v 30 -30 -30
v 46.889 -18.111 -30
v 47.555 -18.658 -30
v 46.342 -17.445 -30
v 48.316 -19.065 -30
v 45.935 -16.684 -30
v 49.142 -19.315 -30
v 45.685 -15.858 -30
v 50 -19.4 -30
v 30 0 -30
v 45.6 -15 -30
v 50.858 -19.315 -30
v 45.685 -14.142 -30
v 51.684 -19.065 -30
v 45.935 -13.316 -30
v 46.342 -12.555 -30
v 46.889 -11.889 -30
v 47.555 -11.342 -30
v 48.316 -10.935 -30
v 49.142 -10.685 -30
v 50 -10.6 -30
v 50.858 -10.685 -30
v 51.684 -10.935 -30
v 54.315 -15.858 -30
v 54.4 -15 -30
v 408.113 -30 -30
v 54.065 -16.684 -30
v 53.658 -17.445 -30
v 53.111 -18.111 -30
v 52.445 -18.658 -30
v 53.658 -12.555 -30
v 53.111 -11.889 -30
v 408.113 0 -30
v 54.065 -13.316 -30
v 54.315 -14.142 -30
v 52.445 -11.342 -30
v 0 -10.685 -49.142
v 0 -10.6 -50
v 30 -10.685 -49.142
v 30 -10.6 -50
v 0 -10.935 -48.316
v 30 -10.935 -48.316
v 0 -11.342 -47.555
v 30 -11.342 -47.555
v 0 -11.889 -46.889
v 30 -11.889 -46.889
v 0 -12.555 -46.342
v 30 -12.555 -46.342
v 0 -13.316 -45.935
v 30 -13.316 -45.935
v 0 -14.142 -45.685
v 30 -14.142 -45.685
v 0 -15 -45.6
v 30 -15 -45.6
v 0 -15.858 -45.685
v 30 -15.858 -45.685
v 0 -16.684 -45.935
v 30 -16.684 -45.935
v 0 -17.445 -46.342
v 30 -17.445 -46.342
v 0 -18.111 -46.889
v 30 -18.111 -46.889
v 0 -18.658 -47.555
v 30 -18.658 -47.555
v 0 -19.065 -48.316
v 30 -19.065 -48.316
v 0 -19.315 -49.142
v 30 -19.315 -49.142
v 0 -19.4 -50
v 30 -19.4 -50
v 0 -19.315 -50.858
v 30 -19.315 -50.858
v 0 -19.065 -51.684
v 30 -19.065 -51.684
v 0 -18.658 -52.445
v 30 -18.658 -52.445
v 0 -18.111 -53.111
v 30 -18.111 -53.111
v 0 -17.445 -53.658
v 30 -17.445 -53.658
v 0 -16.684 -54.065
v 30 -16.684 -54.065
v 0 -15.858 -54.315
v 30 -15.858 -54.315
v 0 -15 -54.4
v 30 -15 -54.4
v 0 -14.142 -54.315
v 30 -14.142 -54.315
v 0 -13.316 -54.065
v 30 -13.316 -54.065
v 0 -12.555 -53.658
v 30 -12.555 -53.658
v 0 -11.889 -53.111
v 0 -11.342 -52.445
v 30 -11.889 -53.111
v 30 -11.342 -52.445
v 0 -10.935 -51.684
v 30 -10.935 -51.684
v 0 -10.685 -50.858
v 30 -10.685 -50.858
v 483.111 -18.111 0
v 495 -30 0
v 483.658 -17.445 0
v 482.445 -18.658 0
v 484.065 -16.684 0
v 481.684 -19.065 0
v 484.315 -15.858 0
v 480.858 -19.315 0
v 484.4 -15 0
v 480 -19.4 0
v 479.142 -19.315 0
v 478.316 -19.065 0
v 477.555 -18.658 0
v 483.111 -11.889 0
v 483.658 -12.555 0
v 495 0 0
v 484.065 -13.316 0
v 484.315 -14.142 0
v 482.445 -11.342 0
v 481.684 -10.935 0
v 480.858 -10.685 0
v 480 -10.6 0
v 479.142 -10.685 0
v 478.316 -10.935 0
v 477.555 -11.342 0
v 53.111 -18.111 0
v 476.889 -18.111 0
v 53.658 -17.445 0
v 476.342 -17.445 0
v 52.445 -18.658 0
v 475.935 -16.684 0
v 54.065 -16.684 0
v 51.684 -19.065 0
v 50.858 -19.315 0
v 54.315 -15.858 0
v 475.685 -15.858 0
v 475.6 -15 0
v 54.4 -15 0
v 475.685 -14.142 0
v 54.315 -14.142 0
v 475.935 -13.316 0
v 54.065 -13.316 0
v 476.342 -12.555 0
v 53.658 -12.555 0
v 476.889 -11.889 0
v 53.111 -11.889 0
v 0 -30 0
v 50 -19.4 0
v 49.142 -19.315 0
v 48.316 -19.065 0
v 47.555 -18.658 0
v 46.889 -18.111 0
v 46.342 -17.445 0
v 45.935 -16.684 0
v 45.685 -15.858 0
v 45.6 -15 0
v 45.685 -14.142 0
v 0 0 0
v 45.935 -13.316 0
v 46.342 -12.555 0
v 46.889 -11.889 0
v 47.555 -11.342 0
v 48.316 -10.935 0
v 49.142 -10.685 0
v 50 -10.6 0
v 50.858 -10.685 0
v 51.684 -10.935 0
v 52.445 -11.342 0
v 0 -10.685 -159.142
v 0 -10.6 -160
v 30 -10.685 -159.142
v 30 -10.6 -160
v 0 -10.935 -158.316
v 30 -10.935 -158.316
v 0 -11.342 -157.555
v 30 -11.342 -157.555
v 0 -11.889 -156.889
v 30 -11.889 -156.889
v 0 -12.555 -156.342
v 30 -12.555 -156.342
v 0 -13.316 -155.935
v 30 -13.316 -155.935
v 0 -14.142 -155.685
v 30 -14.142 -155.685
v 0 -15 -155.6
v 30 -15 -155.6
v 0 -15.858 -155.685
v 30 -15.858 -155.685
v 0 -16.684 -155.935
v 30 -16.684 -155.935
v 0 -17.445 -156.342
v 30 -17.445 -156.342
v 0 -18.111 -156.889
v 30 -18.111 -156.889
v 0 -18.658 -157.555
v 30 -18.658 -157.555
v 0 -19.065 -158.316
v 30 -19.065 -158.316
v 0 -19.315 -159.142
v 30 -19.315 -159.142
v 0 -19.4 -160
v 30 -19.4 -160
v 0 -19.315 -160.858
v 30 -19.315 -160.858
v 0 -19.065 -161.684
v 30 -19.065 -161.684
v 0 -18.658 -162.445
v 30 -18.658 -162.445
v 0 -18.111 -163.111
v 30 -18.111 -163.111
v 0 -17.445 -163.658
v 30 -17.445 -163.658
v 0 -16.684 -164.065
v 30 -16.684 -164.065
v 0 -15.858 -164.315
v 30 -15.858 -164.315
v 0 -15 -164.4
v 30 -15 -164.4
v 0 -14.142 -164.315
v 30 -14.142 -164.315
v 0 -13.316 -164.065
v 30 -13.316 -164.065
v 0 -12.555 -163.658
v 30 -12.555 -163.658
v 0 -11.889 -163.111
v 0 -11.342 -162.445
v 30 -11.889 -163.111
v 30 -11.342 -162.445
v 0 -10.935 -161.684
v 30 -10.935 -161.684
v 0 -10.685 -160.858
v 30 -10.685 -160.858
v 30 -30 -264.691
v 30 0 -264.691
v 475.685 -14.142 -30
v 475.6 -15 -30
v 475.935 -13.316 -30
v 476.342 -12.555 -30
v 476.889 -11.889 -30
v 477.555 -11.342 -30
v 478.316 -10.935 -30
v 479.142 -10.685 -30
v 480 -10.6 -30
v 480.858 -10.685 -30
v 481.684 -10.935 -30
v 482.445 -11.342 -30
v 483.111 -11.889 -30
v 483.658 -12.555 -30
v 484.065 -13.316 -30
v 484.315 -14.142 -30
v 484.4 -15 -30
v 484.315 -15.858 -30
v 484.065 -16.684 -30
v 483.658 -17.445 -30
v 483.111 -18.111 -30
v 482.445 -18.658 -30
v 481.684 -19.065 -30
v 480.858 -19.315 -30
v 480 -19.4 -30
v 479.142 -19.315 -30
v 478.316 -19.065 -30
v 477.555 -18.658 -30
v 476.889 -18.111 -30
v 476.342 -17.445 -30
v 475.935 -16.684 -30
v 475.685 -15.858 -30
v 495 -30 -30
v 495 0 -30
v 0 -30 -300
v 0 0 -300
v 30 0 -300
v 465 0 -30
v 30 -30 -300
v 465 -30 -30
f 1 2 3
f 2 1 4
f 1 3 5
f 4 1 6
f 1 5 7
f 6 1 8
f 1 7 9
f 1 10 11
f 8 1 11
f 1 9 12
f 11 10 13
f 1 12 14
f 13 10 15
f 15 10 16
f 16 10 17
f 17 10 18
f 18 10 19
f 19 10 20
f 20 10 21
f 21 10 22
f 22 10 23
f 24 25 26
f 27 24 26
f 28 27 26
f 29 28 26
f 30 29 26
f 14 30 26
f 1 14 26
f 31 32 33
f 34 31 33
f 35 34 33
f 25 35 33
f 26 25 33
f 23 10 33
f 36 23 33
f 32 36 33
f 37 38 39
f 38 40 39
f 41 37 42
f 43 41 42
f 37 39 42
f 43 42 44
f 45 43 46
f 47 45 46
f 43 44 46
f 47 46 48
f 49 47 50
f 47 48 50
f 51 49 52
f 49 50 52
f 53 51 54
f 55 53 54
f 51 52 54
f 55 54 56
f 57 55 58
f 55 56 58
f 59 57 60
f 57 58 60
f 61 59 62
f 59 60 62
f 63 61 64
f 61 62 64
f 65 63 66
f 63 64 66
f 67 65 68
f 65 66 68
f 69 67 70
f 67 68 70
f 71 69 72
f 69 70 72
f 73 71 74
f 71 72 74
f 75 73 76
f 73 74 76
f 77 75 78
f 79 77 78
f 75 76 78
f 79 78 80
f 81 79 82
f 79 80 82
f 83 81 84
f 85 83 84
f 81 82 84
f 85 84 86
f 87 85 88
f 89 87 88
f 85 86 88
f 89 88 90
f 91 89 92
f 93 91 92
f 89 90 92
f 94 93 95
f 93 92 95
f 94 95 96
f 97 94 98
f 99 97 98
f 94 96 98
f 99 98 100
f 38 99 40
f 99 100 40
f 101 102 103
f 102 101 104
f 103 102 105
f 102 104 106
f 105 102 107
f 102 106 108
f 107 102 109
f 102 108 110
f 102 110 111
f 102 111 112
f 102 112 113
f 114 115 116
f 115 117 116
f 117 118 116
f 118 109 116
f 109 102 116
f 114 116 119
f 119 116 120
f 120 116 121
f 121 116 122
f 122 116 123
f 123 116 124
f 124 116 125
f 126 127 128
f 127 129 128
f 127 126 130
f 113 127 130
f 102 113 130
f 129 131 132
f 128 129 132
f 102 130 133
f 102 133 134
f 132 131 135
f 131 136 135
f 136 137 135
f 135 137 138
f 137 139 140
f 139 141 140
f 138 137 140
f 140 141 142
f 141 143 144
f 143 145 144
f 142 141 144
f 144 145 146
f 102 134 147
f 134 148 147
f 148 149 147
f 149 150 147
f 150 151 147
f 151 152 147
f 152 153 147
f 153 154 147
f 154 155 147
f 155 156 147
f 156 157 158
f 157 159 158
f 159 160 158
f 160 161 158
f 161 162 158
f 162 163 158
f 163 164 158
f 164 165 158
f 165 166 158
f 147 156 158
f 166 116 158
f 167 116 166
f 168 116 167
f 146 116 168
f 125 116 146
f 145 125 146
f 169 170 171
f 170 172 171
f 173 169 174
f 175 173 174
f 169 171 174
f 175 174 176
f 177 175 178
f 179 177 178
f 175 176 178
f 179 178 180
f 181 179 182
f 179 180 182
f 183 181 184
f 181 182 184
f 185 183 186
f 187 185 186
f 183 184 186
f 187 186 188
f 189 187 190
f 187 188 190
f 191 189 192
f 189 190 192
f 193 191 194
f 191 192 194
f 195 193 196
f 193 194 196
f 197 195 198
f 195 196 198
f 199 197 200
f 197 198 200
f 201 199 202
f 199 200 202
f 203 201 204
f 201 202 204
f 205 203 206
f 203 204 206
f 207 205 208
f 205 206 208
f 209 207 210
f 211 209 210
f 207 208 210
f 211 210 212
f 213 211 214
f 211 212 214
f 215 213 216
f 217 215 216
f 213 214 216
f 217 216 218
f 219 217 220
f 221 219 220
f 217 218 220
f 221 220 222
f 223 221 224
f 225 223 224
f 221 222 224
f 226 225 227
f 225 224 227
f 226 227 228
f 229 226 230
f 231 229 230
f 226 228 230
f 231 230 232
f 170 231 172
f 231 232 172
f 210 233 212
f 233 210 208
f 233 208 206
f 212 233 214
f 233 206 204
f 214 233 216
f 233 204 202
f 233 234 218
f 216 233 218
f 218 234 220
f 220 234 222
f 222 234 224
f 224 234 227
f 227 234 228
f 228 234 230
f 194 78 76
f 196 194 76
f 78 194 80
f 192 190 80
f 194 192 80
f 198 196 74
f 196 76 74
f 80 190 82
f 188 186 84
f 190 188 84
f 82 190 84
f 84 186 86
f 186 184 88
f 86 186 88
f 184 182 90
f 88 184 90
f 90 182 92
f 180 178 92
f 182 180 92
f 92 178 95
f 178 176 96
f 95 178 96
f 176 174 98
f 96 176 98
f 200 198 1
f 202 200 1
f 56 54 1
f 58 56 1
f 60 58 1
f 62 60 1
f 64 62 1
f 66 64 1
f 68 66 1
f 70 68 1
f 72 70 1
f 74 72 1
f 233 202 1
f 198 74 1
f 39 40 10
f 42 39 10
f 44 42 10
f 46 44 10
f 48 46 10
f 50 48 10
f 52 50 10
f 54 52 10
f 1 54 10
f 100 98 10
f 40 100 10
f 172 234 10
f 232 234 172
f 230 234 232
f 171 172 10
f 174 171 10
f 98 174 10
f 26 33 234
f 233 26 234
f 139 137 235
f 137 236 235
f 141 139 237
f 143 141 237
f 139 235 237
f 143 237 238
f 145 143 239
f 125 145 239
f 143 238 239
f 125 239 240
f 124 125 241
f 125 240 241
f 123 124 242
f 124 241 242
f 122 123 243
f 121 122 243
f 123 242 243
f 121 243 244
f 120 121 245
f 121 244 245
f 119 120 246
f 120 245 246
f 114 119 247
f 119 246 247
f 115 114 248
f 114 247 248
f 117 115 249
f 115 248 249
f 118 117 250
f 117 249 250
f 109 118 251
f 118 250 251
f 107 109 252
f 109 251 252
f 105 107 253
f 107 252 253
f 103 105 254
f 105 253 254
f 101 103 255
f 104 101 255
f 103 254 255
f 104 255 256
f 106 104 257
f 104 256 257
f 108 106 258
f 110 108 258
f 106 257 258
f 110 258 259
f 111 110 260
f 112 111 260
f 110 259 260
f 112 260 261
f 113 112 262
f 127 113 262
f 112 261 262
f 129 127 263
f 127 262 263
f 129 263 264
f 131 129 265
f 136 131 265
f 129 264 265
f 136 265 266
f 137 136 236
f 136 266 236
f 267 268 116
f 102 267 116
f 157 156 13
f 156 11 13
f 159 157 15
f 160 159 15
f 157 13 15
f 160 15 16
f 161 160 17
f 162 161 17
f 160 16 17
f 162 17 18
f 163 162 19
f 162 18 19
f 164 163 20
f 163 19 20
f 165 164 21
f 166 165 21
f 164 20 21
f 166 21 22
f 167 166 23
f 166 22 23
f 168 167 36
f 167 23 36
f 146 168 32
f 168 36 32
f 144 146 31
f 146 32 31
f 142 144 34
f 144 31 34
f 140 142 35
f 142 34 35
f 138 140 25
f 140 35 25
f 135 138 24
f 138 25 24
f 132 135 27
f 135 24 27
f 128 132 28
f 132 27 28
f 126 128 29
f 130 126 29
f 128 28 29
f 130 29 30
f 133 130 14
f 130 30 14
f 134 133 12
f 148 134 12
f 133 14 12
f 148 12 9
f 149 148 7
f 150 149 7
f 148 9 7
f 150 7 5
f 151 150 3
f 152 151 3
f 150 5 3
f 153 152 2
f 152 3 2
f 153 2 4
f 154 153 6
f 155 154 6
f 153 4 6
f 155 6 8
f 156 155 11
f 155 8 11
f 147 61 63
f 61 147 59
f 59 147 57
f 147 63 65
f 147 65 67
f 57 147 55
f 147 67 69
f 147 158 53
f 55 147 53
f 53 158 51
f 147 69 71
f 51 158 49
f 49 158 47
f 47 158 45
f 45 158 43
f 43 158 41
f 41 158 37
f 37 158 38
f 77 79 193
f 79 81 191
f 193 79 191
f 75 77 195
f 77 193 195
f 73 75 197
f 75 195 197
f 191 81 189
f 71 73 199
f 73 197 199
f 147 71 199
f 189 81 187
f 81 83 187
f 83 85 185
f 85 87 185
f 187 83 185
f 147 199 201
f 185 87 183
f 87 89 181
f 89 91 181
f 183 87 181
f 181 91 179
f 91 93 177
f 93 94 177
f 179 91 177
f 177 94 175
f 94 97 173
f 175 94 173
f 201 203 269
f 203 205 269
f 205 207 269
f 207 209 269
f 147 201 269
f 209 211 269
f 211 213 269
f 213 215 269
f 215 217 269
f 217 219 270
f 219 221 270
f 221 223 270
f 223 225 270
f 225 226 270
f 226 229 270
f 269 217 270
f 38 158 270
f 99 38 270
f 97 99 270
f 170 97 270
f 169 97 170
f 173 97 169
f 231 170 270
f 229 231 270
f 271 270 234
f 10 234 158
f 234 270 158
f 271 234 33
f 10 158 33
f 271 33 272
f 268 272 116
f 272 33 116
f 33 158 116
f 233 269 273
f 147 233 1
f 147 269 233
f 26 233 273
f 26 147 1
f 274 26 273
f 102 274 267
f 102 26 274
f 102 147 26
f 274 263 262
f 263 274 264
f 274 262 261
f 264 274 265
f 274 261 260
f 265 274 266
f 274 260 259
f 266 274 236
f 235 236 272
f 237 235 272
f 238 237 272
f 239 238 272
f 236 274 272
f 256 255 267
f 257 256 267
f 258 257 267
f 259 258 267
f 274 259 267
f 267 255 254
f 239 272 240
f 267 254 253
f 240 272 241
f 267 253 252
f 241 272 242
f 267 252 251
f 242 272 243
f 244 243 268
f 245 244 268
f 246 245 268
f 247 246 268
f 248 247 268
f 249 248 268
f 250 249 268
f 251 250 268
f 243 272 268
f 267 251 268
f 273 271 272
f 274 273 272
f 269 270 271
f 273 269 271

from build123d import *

# Parameters (mm, degrees)
F1_DEPTH = 30
F3_D     = 8.8
F3_DEPTH = 30
F3_TIP   = 2.6437867237
F5_D     = 8.8
F5_DEPTH = 30
F5_TIP   = 2.6437867237


with BuildPart() as f1:
    # F0 (on Front) → F1 (new body)
    with BuildSketch(Plane.XZ):
        Polygon((495, 0), (0, 0), (0, -300), (30, -300), (465, -30), (495, -30), align=None)
        Polygon((30, -264.6909348292), (30, -30), (408.1131727804, -30), align=None, mode=Mode.SUBTRACT)
    extrude(amount=F1_DEPTH)

    # F3
    with Locations(Plane(origin=(0, 0, 0), x_dir=(0, -1, 0), z_dir=(-1, 0, 0))):
        with Locations((15, -50), (15, -160)):
            Hole(F3_D / 2, depth=F3_DEPTH)
            with Locations((0, 0, -(F3_DEPTH + F3_TIP / 2))):  # 118° drill point
                Cone(0, F3_D / 2, F3_TIP, mode=Mode.SUBTRACT)

    # F5
    with Locations(Plane.XY):
        with Locations((480, -15), (50, -15)):
            Hole(F5_D / 2, depth=F5_DEPTH)
            with Locations((0, 0, -(F5_DEPTH + F5_TIP / 2))):  # 118° drill point
                Cone(0, F5_D / 2, F5_TIP, mode=Mode.SUBTRACT)


solid = f1.part
